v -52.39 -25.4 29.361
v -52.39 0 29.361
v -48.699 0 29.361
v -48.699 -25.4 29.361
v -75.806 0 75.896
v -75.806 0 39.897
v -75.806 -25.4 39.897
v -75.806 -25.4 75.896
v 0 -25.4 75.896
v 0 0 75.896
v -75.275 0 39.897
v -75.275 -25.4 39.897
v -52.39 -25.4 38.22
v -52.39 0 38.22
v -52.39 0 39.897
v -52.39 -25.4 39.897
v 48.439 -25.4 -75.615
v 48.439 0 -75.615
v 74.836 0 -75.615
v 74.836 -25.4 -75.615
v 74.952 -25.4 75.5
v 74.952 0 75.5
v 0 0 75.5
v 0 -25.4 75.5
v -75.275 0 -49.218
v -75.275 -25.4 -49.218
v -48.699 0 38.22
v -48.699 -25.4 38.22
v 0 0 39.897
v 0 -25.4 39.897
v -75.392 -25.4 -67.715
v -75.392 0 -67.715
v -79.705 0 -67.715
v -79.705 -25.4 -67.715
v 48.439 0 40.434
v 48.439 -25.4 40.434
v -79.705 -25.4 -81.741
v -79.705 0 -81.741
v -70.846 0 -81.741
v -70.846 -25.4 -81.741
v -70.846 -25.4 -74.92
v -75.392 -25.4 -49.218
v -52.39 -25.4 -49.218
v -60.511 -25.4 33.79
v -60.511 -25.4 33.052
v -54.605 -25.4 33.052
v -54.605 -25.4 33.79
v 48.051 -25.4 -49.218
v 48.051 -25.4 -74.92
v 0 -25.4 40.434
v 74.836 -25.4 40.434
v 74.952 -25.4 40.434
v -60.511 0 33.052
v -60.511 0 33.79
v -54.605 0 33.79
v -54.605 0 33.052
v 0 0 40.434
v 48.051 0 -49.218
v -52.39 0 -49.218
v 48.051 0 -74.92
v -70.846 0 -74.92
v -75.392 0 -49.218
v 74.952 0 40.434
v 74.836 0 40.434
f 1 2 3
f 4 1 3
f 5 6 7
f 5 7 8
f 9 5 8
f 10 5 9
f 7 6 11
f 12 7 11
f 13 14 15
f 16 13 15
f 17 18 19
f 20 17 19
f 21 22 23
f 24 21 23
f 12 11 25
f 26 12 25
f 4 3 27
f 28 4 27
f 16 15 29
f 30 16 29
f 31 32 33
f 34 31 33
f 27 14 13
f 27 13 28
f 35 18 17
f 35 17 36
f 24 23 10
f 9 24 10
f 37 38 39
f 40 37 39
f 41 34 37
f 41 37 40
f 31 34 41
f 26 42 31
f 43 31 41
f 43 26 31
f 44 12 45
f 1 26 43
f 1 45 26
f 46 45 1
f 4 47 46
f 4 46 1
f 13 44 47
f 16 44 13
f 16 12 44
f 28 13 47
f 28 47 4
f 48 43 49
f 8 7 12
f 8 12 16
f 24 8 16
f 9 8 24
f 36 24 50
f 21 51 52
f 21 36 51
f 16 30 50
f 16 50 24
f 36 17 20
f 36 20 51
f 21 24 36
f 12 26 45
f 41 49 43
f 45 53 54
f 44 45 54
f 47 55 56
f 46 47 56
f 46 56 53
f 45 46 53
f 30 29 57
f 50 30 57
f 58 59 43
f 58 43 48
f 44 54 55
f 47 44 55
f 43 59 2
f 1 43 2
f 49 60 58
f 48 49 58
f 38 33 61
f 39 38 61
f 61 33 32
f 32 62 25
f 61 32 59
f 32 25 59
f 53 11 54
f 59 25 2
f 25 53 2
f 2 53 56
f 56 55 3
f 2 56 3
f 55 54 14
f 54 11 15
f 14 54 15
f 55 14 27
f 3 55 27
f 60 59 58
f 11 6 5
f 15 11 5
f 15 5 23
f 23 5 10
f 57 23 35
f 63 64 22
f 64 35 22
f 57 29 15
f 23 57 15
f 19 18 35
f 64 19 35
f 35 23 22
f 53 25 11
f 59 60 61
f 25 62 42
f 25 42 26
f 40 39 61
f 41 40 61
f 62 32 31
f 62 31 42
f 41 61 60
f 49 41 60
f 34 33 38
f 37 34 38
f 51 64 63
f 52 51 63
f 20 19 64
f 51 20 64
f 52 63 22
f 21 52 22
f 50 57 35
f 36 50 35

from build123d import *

# Parameters (mm, degrees)
F0_W     = 75.805991888
F0_H     = 35.9990932047
F1_DEPTH = 25.4
F3_W     = 3.6910921335
F3_H     = 8.858628571
F3_W_2   = 4.4293105602
F3_H_2   = 7.0130825043
F4_DEPTH = 25.4
F5_DEPTH = 25.4
F6_W     = 26.3966843486
F6_H     = 116.8616563082
F7_DEPTH = 25.4
F8_W     = 123.443312943
F8_H     = 25.7022343576
F9_DEPTH = 25.4


with BuildPart() as f1:
    # F0 (on Front) → F1 (new body)
    with BuildSketch(Plane.XZ):
        with Locations((-37.902995944, 57.8962471336)):
            Rectangle(F0_W, F0_H)
    extrude(amount=F1_DEPTH)

    # F3 (on Front) → F4 (join)
    with BuildSketch(Plane.XZ):
        Polygon((-60.510866344, 33.7904244661), (-54.6051189303, 33.7904244661), (-54.6051189303, 33.0522060394), (-60.510866344, 33.0522060394), (-60.510866344, 29.3611101806), (-52.3904636502, 29.3611101806), (-52.3904636502, 38.2197387516), (-60.510866344, 38.2197387516), align=None)
        Polygon((-60.510866344, 33.0522060394), (-60.510866344, 33.7904244661), (-60.510866344, 38.2197387516), (-52.3904636502, 38.2197387516), (-52.3904636502, 59.6280917525), (-75.2752497792, 59.6280917525), (-75.2752497792, -67.7146911621), (-70.845939219, -67.7146911621), (-70.845939219, -74.7277736664), (-52.3904636502, -74.7277736664), (-52.3904636502, 29.3611101806), (-60.510866344, 29.3611101806), align=None)
        with Locations((-50.5449175835, 33.7904244661)):
            Rectangle(F3_W, F3_H)
        with Locations((-73.0605944991, -71.2212324142)):
            Rectangle(F3_W_2, F3_H_2)
        Polygon((-70.845939219, -81.7408561707), (-70.845939219, -74.7277736664), (-75.2752497792, -74.7277736664), (-75.2752497792, -67.7146911621), (-79.7045603395, -67.7146911621), (-79.7045603395, -81.7408561707), align=None)
    extrude(amount=F4_DEPTH)

    # F2 (on Front) → F5 (join)
    with BuildSketch(Plane.XZ):
        Polygon((74.952326715, 40.4343977571), (74.952326715, 75.4998028278), (0, 75.4998028278), (0, 40.4343977571), (25.4916474223, 40.4343977571), align=None)
    extrude(amount=F5_DEPTH)

    # F6 (on Front) → F7 (join)
    with BuildSketch(Plane.XZ):
        with Locations((61.6374202073, -17.1837881207)):
            Rectangle(F6_W, F6_H)
    extrude(amount=F7_DEPTH)

    # F8 (on Front) → F9 (join)
    with BuildSketch(Plane.XZ):
        with Locations((-13.6707611382, -62.0693061501)):
            Rectangle(F8_W, F8_H)
    extrude(amount=F9_DEPTH)


solid = f1.part
